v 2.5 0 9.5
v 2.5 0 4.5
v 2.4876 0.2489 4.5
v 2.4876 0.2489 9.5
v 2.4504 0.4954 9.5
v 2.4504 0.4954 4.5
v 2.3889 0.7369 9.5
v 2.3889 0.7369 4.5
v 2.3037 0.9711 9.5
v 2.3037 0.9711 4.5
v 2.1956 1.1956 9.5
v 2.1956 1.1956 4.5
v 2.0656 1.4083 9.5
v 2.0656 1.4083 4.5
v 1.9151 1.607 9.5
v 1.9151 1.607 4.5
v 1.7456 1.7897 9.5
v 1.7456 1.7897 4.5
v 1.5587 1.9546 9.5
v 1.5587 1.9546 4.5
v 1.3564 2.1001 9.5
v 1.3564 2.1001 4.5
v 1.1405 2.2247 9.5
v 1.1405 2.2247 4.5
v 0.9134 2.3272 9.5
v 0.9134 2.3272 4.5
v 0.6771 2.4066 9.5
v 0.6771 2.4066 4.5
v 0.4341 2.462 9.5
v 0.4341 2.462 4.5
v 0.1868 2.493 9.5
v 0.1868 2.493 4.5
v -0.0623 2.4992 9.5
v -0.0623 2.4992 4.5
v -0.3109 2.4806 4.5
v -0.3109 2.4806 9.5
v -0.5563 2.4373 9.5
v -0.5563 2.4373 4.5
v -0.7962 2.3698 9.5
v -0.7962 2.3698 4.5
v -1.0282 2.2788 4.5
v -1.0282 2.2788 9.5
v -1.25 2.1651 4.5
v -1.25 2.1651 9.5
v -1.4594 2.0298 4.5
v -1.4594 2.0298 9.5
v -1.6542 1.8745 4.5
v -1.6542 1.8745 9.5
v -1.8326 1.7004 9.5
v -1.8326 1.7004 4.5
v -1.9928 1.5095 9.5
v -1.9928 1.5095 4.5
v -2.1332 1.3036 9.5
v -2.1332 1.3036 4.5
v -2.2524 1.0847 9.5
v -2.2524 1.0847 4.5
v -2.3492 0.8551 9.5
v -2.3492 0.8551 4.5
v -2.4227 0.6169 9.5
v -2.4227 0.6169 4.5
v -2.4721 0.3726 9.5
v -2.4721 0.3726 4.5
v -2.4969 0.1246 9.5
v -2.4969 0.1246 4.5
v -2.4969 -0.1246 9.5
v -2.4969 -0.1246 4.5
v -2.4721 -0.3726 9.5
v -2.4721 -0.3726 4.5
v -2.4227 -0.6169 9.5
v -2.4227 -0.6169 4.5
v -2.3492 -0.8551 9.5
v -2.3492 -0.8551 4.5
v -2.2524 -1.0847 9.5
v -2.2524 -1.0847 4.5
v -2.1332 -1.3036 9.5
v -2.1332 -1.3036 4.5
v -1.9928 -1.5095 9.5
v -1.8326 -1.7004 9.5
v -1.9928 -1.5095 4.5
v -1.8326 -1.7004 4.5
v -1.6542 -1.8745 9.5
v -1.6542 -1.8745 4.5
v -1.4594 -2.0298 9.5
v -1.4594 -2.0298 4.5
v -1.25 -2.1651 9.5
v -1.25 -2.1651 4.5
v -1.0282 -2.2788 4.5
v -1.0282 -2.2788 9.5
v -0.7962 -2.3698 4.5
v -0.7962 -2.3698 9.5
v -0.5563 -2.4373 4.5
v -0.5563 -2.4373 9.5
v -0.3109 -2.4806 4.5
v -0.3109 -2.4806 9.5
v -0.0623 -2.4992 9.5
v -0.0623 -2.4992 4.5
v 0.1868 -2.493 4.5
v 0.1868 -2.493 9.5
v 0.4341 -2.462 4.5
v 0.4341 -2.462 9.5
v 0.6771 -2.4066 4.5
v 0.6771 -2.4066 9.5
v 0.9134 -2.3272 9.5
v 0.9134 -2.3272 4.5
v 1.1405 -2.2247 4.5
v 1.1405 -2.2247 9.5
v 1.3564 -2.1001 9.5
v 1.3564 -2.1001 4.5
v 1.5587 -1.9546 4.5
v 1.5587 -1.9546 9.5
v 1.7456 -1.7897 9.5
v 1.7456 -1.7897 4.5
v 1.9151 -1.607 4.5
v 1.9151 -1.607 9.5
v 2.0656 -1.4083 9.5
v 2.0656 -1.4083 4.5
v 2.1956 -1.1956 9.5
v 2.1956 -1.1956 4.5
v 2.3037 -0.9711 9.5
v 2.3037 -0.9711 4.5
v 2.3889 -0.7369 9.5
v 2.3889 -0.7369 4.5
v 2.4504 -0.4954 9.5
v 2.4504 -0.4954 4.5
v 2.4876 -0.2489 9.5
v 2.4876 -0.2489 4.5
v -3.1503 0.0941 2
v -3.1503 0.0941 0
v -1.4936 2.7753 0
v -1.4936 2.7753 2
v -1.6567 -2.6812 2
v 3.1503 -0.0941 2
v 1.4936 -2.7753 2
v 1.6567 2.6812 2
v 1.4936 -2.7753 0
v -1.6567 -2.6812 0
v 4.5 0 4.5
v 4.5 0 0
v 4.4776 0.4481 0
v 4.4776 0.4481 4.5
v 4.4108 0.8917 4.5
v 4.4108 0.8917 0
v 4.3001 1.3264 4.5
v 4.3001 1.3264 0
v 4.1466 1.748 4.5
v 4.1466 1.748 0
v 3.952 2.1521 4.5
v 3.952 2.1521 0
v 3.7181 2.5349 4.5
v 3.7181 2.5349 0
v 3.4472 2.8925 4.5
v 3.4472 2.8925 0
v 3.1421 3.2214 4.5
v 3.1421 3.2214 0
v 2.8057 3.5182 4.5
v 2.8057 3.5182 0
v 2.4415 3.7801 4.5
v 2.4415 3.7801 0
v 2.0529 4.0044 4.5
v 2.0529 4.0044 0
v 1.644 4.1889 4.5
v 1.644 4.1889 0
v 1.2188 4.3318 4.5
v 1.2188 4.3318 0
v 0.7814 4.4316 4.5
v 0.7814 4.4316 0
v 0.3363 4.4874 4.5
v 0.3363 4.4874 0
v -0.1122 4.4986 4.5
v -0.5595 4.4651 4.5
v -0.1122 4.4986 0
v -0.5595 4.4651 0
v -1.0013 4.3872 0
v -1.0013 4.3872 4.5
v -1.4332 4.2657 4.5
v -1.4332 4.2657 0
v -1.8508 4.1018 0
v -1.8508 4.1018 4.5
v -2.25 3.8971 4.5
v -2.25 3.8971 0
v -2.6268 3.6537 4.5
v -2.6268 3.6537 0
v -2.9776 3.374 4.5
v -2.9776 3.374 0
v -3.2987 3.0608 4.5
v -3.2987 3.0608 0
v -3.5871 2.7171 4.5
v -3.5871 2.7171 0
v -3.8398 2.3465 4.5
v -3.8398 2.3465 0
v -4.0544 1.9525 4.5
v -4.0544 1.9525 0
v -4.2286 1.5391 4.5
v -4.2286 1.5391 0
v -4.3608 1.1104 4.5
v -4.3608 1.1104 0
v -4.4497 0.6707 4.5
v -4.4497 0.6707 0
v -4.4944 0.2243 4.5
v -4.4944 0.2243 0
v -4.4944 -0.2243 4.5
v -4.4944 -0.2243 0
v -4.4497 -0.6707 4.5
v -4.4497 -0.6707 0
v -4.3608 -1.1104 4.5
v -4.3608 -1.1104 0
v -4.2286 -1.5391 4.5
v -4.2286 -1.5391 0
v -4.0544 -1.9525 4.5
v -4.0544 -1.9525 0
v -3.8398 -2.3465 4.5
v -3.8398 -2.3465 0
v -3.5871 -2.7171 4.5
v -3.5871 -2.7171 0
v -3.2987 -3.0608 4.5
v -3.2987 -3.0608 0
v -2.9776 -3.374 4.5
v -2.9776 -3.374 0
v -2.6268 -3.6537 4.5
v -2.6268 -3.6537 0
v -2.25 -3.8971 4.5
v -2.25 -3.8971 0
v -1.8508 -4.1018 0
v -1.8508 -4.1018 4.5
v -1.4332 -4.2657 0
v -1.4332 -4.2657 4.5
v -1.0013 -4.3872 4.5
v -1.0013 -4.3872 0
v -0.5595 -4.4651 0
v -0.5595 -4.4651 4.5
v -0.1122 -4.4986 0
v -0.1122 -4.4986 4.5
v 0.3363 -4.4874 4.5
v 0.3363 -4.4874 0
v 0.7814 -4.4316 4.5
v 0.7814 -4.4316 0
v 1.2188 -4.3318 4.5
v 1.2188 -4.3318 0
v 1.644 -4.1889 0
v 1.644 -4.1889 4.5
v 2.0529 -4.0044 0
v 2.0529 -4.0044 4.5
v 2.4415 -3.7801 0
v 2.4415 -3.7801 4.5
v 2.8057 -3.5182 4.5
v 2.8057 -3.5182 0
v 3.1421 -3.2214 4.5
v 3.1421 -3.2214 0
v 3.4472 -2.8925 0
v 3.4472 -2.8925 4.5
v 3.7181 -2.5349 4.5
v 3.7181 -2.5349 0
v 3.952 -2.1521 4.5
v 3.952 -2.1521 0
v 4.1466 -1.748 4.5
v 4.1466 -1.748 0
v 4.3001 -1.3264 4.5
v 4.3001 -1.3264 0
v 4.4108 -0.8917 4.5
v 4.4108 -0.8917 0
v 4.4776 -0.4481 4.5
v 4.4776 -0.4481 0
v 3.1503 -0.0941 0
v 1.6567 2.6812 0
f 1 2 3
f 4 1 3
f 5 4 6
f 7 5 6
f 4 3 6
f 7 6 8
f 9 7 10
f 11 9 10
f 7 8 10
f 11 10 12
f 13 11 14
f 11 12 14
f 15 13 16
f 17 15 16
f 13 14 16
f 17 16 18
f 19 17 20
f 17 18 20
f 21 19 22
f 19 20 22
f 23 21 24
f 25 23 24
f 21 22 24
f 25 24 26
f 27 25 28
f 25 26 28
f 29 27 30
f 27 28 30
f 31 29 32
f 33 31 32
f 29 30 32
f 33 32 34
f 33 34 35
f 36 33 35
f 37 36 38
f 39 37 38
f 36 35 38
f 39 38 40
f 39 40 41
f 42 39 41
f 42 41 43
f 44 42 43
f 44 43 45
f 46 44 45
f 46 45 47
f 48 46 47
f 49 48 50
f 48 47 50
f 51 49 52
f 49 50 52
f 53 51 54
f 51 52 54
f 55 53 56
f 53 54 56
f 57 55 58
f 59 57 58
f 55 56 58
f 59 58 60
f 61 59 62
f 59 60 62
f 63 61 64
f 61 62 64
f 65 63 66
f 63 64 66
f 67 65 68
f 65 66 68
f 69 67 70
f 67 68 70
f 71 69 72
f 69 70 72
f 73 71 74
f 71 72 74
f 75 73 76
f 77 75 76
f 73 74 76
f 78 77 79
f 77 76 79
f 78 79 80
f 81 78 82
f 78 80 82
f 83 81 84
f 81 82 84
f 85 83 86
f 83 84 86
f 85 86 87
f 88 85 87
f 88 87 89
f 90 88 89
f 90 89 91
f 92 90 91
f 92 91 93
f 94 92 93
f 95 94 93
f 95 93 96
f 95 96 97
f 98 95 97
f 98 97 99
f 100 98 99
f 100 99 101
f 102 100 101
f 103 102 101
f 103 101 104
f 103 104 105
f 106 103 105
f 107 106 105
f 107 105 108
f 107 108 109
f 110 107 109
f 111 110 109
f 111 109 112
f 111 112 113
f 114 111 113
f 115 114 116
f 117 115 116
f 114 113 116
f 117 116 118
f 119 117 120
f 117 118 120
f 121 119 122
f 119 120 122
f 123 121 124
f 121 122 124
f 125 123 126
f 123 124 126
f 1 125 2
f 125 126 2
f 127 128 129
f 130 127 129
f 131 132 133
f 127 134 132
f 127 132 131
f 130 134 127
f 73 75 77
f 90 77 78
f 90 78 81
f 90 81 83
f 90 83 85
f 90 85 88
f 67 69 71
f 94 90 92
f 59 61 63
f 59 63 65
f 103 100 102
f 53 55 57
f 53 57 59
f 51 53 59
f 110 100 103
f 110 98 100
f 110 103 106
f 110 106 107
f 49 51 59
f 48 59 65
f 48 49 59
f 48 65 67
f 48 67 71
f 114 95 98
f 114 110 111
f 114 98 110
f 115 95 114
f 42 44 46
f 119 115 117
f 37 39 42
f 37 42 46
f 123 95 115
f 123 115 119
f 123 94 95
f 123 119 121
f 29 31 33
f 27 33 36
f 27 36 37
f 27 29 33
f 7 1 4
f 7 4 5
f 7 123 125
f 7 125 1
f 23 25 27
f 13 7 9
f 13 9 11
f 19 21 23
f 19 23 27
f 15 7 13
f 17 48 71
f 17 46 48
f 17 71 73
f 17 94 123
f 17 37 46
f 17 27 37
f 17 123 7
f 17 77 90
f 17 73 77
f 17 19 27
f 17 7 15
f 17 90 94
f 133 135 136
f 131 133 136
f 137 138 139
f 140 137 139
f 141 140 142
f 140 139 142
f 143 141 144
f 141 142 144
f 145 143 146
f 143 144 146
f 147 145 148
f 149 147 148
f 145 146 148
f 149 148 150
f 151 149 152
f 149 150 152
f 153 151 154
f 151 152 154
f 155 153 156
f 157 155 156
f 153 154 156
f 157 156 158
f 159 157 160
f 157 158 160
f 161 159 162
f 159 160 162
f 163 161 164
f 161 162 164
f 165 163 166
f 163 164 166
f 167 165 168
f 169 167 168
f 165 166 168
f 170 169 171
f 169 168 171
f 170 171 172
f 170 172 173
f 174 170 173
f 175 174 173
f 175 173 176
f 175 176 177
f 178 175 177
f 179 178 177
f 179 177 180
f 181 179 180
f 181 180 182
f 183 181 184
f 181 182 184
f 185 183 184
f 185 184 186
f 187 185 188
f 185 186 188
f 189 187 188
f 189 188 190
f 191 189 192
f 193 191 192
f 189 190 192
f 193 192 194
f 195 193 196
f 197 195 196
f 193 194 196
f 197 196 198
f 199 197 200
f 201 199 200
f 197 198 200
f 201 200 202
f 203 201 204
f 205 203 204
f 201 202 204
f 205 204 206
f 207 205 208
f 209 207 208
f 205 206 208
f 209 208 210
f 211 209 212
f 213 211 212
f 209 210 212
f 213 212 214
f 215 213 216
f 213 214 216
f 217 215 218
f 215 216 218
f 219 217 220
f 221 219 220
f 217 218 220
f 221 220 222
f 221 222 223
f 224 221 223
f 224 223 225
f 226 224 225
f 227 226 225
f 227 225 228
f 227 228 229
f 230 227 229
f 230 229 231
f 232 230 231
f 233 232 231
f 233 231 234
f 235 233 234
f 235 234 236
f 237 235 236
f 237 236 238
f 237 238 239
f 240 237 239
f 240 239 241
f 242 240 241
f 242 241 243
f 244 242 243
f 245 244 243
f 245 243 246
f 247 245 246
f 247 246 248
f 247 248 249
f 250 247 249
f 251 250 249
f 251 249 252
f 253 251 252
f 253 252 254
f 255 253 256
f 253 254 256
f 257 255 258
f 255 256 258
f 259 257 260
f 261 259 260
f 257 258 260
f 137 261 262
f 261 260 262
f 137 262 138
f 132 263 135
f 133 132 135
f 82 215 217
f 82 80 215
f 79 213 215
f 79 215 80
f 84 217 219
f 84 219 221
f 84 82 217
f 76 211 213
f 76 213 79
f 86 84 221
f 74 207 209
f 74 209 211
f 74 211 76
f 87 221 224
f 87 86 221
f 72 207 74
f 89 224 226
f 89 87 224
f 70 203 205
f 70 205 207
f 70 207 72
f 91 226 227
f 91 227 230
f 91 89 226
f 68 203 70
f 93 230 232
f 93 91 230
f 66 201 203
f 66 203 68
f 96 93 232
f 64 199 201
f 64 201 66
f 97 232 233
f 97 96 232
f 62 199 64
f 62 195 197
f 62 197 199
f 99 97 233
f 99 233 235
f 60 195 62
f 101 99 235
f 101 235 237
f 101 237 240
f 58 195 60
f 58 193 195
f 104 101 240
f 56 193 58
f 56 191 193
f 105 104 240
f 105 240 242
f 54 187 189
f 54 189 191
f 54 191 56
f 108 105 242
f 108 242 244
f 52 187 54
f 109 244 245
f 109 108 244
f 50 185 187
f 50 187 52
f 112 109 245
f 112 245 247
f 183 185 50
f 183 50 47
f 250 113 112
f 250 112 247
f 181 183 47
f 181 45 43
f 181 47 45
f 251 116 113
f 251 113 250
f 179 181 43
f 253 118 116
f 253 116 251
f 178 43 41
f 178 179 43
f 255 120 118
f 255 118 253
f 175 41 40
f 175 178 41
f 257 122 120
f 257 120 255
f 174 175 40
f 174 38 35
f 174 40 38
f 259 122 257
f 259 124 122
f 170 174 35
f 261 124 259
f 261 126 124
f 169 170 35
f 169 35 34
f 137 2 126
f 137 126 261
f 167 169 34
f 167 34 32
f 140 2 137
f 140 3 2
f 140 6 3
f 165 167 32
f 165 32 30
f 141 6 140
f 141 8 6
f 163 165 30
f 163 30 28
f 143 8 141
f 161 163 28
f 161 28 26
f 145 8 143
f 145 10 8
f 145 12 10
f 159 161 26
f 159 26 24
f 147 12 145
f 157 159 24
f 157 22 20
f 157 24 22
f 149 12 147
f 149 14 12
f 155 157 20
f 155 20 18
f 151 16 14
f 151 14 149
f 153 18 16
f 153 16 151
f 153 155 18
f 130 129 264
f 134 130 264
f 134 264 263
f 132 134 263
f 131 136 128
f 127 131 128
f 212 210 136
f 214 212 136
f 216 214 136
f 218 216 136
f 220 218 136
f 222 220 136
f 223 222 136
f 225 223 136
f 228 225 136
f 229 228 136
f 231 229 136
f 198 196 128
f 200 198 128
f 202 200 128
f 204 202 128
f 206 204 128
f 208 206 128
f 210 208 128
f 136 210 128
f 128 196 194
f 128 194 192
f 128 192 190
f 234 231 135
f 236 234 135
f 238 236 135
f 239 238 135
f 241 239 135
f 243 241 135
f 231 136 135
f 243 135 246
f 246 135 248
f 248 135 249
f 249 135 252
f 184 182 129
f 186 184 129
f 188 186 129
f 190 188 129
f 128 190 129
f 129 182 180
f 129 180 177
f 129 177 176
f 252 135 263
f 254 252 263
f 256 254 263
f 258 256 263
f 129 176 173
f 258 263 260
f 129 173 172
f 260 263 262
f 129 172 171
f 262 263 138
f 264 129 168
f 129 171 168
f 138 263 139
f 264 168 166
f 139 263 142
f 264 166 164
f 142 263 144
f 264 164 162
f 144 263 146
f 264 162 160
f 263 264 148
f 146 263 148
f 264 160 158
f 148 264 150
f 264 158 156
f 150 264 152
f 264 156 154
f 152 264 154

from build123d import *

# Parameters (mm, degrees)
SKETCH1_R           = 4.5
BOSS_EXTRUDE3_DEPTH = 4.5
CUT_EXTRUDE2_DEPTH  = 2
SKETCH5_R           = 2.5
BOSS_EXTRUDE4_DEPTH = 5


with BuildPart() as part:
    # Sketch1 → Boss-Extrude3 (new body)
    with BuildSketch(Plane.XY):
        Circle(SKETCH1_R)
    extrude(amount=BOSS_EXTRUDE3_DEPTH)

    # Sketch4 → Cut-Extrude2 (cut)
    with BuildSketch(Plane(origin=(0, 0, 0), x_dir=(-1, 0, 0), z_dir=(0, 0, -1))):
        Polygon((3.150328976, 0.094133336), (1.493642628, 2.775331592), (-1.656686348, 2.681198256), (-3.150328976, -0.094133336), (-1.493642628, -2.775331592), (1.656686348, -2.681198256), align=None)
    extrude(amount=-CUT_EXTRUDE2_DEPTH, mode=Mode.SUBTRACT)

    # Sketch5 → Boss-Extrude4 (add)
    with BuildSketch(Plane.XY.offset(4.5)):
        Circle(SKETCH5_R)
    extrude(amount=BOSS_EXTRUDE4_DEPTH)


solid = part.part
